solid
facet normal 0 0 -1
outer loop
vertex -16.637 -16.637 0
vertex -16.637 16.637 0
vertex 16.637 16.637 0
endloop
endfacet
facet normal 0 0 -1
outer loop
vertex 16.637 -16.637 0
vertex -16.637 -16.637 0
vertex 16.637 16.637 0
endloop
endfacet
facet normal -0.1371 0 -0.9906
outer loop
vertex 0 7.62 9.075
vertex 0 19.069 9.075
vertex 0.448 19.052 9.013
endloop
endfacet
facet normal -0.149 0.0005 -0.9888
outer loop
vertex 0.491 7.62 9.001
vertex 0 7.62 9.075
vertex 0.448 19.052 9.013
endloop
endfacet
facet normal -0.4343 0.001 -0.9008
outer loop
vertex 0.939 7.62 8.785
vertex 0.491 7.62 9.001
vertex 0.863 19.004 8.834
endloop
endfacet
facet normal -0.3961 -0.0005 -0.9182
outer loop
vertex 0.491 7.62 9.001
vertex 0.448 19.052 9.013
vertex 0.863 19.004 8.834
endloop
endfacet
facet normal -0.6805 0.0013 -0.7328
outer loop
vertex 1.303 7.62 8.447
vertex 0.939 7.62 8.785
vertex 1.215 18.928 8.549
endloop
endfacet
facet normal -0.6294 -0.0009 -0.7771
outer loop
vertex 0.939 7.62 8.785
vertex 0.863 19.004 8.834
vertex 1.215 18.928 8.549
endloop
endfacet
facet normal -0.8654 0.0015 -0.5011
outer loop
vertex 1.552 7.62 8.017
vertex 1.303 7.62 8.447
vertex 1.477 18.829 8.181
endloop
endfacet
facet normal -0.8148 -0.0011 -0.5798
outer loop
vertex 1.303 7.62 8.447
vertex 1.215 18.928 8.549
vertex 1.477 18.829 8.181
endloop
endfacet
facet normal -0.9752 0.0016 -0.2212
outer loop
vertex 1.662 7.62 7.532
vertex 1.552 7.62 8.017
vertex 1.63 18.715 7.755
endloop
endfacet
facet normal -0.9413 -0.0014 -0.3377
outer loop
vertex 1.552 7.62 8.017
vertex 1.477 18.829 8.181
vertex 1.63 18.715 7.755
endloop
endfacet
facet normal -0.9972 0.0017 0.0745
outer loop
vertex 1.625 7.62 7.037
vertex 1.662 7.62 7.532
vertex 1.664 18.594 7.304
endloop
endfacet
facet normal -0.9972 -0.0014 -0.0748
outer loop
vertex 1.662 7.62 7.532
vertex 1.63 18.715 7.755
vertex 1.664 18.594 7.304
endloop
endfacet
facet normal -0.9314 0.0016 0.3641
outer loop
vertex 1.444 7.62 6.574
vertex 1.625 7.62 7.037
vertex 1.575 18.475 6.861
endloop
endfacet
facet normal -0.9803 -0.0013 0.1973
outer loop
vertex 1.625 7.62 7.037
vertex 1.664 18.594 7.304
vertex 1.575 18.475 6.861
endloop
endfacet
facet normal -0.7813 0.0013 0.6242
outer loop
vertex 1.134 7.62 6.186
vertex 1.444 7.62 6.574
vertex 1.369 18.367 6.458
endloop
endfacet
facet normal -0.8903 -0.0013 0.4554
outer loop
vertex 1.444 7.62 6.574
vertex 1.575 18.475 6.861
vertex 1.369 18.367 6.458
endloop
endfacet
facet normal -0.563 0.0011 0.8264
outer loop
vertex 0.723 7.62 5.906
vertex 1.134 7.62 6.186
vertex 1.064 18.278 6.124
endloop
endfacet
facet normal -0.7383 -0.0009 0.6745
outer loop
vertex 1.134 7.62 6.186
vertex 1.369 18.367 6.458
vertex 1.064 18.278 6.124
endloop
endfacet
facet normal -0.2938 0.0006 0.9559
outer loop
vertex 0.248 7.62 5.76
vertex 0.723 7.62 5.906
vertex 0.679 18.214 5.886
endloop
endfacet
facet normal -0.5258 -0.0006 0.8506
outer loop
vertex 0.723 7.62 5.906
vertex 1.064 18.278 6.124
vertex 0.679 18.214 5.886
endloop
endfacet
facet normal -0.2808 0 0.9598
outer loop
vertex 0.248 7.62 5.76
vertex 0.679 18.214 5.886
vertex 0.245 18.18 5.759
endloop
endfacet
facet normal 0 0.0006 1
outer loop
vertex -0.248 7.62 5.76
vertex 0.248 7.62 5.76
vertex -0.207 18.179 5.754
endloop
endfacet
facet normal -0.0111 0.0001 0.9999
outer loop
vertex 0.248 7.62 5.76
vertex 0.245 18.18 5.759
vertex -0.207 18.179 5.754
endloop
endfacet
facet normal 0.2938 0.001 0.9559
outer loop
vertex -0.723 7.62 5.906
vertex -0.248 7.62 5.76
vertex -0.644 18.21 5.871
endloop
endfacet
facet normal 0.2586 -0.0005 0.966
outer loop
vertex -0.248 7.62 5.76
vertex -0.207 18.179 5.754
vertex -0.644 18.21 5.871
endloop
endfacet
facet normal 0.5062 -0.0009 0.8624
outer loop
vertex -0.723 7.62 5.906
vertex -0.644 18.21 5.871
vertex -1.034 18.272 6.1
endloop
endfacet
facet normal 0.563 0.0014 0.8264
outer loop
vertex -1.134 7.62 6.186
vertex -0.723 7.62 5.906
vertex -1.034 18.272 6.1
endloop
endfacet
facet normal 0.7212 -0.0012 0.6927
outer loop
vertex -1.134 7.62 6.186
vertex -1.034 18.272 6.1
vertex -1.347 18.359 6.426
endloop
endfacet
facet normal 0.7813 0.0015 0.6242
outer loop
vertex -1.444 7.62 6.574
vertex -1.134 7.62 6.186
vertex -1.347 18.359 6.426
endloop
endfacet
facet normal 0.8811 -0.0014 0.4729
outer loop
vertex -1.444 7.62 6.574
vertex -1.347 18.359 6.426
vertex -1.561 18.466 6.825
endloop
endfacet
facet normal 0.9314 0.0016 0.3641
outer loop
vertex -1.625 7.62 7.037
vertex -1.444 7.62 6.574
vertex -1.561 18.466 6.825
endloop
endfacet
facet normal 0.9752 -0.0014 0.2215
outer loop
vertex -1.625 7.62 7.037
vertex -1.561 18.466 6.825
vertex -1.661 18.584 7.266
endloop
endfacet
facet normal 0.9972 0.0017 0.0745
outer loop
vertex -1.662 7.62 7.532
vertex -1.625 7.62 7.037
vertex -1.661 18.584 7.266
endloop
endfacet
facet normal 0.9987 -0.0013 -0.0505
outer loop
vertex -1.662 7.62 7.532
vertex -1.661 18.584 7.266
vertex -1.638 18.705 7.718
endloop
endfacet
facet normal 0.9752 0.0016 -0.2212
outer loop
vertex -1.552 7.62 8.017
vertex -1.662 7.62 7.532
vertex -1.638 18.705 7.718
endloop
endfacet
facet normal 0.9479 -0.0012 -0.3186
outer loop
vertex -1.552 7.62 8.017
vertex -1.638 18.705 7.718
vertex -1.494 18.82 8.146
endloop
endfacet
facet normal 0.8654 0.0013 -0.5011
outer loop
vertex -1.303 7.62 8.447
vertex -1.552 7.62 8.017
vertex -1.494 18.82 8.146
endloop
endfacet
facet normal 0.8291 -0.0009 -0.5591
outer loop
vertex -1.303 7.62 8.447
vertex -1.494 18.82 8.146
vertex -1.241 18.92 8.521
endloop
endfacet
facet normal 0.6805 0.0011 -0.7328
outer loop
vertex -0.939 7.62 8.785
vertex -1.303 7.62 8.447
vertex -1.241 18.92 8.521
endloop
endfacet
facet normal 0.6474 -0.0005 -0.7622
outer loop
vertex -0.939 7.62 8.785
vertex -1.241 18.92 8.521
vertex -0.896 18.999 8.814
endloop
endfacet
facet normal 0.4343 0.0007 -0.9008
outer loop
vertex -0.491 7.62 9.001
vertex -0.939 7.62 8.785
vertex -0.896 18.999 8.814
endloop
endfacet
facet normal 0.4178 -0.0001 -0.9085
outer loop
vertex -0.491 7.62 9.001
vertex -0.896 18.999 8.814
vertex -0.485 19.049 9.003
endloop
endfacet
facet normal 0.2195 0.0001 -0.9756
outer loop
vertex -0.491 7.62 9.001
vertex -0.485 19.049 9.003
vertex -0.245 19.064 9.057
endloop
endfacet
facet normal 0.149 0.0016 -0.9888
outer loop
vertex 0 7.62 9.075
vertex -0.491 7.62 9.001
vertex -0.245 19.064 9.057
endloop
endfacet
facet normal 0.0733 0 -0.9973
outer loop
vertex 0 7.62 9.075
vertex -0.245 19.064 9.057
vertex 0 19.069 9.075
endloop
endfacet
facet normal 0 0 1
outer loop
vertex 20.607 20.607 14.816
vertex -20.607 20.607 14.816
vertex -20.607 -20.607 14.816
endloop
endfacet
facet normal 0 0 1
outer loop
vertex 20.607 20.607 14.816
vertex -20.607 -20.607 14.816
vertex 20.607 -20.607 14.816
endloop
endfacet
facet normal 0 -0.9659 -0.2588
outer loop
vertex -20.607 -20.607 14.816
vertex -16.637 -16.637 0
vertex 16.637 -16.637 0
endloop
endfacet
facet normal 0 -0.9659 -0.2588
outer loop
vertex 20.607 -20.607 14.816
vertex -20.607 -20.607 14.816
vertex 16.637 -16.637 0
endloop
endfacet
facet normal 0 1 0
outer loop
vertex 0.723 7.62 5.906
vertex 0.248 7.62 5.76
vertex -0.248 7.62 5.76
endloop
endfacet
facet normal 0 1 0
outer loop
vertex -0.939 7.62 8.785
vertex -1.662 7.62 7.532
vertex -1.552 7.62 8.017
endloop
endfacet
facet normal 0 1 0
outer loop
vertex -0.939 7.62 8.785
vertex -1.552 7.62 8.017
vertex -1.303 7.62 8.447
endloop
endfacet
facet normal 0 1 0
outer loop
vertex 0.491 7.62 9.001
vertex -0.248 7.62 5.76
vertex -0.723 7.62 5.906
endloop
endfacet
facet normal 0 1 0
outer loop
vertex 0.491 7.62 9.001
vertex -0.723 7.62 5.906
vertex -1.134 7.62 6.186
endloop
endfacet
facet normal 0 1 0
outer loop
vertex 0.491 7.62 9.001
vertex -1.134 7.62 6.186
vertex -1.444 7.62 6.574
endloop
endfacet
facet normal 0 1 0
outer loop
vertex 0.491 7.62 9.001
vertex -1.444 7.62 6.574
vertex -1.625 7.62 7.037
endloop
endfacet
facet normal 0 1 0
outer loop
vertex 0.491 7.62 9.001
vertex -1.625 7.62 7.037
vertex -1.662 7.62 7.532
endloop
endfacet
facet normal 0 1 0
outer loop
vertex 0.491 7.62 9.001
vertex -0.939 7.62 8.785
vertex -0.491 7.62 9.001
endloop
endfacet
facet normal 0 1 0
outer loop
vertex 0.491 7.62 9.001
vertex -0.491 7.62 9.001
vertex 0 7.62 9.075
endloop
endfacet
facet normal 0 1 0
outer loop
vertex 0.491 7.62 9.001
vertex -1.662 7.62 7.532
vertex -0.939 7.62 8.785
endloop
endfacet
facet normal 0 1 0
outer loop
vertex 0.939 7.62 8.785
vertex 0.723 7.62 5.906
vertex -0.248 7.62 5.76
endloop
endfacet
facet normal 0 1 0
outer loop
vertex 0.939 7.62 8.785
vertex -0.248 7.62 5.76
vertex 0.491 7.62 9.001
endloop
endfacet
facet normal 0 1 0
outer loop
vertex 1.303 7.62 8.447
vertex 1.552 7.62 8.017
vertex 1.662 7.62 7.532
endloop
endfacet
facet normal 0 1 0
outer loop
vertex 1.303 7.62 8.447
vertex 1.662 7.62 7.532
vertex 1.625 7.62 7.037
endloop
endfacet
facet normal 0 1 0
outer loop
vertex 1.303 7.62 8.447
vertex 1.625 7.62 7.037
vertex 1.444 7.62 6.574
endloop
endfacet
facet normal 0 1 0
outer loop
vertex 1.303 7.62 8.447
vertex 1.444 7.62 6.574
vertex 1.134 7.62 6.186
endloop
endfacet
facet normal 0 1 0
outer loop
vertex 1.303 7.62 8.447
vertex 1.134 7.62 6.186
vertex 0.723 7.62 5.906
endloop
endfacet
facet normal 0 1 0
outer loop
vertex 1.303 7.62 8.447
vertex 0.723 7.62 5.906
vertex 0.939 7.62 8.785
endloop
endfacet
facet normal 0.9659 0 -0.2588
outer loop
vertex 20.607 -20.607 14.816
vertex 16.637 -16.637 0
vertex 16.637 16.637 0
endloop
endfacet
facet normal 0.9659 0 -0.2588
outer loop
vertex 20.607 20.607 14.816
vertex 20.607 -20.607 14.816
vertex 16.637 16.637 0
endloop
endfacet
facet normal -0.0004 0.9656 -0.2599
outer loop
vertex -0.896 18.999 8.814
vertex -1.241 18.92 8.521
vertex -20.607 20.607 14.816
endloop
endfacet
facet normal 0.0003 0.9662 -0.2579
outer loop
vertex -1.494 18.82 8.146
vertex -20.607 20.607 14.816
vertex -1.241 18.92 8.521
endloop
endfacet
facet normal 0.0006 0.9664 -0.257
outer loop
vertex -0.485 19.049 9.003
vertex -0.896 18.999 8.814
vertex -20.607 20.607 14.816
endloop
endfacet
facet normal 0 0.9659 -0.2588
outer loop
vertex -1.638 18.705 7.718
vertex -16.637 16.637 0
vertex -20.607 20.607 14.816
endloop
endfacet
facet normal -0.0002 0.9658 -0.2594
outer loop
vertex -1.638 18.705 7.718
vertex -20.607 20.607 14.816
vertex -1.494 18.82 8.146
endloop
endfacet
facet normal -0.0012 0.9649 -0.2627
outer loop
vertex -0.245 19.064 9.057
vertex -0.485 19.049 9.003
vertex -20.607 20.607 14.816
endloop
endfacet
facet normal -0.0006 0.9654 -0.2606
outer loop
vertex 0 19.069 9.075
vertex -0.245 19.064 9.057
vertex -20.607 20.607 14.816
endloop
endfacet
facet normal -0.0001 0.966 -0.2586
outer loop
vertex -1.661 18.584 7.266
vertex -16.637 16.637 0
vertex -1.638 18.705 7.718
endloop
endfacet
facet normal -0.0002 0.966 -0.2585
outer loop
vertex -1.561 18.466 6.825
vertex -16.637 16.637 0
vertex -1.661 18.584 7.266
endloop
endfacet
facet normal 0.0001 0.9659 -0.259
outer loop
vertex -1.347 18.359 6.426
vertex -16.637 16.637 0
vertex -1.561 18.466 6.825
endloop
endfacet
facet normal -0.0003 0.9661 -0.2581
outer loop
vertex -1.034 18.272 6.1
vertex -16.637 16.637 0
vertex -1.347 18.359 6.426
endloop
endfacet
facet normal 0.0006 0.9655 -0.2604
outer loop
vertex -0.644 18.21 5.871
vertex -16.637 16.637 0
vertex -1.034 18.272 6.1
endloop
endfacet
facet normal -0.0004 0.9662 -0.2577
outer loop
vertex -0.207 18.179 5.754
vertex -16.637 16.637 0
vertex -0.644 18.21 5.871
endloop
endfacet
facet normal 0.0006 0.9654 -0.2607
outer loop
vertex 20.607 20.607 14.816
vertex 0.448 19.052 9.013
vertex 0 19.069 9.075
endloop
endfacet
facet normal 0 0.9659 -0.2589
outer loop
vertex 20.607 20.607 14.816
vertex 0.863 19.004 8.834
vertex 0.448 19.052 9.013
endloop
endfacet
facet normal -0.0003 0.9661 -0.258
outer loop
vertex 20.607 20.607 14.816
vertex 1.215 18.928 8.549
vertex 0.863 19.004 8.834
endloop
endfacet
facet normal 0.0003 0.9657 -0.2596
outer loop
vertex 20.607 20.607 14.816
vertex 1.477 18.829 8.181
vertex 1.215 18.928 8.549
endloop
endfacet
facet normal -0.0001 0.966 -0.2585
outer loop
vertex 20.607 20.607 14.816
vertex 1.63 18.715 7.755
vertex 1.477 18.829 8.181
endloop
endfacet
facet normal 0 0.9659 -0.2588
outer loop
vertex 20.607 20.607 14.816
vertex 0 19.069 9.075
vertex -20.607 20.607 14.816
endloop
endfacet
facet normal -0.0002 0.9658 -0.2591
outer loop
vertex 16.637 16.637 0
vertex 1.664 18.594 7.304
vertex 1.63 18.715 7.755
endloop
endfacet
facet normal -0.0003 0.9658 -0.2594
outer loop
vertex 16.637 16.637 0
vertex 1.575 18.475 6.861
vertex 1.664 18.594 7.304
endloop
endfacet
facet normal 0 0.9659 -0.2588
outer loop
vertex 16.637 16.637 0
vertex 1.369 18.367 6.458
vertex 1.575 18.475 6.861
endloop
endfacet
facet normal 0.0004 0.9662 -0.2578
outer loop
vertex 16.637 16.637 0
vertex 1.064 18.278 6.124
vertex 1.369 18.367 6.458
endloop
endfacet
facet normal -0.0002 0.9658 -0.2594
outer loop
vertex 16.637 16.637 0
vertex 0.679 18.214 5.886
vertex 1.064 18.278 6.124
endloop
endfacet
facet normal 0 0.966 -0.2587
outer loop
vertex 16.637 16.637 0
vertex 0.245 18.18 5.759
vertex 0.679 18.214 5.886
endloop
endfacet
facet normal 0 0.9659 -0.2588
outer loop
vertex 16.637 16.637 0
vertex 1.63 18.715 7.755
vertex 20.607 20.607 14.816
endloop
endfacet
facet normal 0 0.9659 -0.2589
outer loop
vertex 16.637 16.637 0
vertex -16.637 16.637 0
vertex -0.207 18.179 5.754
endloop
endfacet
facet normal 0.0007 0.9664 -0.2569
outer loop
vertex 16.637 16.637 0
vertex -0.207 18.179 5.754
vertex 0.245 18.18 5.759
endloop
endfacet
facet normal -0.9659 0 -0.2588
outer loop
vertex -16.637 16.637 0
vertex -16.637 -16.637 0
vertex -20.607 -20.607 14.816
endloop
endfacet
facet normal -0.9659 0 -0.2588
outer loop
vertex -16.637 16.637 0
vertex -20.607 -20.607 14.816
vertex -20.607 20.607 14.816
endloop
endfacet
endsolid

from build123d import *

# Parameters (mm, degrees)
ESQUISSE1_W             = 33.274
ESQUISSE1_H             = 33.274
BOSS_EXTRU_1_DEPTH      = 14.81582
BOSS_EXTRU_1_DRAFT      = -15
ENL_V_MAT_EXTRU_1_DEPTH = 12.7


with BuildPart() as part:
    # Esquisse1 → Boss.-Extru.1 (with draft: the straight prism first)
    with BuildSketch(Plane.XY):
        Rectangle(ESQUISSE1_W, ESQUISSE1_H)
    extrude(amount=BOSS_EXTRU_1_DEPTH)
    # Boss.-Extru.1: the draft: its side faces are tilted about the plane it starts from
    boss_extru_1_sides = [part.faces().sort_by_distance(p)[0] for p in [
        (0, -16.637, 7.40791),
        (16.637, 0, 7.40791),
        (0, 16.637, 7.40791),
        (-16.637, 0, 7.40791),
    ]]
    draft(boss_extru_1_sides, Plane.XY, BOSS_EXTRU_1_DRAFT)

    # Esquisse2 → Enlèv. mat.-Extru.1 (cut)
    with BuildSketch(Plane(origin=(0, 20.32, 0), x_dir=(1, 0, 0), z_dir=(0, 1, 0))):
        with BuildLine():
            ThreePointArc((0, -5.741035), (-1.178658616, -8.586568616), (1.666875, -7.40791))
            ThreePointArc((1.666875, -7.40791), (1.178658616, -6.229251384), (0, -5.741035))
        make_face()
    extrude(amount=-ENL_V_MAT_EXTRU_1_DEPTH, mode=Mode.SUBTRACT)


solid = part.part
